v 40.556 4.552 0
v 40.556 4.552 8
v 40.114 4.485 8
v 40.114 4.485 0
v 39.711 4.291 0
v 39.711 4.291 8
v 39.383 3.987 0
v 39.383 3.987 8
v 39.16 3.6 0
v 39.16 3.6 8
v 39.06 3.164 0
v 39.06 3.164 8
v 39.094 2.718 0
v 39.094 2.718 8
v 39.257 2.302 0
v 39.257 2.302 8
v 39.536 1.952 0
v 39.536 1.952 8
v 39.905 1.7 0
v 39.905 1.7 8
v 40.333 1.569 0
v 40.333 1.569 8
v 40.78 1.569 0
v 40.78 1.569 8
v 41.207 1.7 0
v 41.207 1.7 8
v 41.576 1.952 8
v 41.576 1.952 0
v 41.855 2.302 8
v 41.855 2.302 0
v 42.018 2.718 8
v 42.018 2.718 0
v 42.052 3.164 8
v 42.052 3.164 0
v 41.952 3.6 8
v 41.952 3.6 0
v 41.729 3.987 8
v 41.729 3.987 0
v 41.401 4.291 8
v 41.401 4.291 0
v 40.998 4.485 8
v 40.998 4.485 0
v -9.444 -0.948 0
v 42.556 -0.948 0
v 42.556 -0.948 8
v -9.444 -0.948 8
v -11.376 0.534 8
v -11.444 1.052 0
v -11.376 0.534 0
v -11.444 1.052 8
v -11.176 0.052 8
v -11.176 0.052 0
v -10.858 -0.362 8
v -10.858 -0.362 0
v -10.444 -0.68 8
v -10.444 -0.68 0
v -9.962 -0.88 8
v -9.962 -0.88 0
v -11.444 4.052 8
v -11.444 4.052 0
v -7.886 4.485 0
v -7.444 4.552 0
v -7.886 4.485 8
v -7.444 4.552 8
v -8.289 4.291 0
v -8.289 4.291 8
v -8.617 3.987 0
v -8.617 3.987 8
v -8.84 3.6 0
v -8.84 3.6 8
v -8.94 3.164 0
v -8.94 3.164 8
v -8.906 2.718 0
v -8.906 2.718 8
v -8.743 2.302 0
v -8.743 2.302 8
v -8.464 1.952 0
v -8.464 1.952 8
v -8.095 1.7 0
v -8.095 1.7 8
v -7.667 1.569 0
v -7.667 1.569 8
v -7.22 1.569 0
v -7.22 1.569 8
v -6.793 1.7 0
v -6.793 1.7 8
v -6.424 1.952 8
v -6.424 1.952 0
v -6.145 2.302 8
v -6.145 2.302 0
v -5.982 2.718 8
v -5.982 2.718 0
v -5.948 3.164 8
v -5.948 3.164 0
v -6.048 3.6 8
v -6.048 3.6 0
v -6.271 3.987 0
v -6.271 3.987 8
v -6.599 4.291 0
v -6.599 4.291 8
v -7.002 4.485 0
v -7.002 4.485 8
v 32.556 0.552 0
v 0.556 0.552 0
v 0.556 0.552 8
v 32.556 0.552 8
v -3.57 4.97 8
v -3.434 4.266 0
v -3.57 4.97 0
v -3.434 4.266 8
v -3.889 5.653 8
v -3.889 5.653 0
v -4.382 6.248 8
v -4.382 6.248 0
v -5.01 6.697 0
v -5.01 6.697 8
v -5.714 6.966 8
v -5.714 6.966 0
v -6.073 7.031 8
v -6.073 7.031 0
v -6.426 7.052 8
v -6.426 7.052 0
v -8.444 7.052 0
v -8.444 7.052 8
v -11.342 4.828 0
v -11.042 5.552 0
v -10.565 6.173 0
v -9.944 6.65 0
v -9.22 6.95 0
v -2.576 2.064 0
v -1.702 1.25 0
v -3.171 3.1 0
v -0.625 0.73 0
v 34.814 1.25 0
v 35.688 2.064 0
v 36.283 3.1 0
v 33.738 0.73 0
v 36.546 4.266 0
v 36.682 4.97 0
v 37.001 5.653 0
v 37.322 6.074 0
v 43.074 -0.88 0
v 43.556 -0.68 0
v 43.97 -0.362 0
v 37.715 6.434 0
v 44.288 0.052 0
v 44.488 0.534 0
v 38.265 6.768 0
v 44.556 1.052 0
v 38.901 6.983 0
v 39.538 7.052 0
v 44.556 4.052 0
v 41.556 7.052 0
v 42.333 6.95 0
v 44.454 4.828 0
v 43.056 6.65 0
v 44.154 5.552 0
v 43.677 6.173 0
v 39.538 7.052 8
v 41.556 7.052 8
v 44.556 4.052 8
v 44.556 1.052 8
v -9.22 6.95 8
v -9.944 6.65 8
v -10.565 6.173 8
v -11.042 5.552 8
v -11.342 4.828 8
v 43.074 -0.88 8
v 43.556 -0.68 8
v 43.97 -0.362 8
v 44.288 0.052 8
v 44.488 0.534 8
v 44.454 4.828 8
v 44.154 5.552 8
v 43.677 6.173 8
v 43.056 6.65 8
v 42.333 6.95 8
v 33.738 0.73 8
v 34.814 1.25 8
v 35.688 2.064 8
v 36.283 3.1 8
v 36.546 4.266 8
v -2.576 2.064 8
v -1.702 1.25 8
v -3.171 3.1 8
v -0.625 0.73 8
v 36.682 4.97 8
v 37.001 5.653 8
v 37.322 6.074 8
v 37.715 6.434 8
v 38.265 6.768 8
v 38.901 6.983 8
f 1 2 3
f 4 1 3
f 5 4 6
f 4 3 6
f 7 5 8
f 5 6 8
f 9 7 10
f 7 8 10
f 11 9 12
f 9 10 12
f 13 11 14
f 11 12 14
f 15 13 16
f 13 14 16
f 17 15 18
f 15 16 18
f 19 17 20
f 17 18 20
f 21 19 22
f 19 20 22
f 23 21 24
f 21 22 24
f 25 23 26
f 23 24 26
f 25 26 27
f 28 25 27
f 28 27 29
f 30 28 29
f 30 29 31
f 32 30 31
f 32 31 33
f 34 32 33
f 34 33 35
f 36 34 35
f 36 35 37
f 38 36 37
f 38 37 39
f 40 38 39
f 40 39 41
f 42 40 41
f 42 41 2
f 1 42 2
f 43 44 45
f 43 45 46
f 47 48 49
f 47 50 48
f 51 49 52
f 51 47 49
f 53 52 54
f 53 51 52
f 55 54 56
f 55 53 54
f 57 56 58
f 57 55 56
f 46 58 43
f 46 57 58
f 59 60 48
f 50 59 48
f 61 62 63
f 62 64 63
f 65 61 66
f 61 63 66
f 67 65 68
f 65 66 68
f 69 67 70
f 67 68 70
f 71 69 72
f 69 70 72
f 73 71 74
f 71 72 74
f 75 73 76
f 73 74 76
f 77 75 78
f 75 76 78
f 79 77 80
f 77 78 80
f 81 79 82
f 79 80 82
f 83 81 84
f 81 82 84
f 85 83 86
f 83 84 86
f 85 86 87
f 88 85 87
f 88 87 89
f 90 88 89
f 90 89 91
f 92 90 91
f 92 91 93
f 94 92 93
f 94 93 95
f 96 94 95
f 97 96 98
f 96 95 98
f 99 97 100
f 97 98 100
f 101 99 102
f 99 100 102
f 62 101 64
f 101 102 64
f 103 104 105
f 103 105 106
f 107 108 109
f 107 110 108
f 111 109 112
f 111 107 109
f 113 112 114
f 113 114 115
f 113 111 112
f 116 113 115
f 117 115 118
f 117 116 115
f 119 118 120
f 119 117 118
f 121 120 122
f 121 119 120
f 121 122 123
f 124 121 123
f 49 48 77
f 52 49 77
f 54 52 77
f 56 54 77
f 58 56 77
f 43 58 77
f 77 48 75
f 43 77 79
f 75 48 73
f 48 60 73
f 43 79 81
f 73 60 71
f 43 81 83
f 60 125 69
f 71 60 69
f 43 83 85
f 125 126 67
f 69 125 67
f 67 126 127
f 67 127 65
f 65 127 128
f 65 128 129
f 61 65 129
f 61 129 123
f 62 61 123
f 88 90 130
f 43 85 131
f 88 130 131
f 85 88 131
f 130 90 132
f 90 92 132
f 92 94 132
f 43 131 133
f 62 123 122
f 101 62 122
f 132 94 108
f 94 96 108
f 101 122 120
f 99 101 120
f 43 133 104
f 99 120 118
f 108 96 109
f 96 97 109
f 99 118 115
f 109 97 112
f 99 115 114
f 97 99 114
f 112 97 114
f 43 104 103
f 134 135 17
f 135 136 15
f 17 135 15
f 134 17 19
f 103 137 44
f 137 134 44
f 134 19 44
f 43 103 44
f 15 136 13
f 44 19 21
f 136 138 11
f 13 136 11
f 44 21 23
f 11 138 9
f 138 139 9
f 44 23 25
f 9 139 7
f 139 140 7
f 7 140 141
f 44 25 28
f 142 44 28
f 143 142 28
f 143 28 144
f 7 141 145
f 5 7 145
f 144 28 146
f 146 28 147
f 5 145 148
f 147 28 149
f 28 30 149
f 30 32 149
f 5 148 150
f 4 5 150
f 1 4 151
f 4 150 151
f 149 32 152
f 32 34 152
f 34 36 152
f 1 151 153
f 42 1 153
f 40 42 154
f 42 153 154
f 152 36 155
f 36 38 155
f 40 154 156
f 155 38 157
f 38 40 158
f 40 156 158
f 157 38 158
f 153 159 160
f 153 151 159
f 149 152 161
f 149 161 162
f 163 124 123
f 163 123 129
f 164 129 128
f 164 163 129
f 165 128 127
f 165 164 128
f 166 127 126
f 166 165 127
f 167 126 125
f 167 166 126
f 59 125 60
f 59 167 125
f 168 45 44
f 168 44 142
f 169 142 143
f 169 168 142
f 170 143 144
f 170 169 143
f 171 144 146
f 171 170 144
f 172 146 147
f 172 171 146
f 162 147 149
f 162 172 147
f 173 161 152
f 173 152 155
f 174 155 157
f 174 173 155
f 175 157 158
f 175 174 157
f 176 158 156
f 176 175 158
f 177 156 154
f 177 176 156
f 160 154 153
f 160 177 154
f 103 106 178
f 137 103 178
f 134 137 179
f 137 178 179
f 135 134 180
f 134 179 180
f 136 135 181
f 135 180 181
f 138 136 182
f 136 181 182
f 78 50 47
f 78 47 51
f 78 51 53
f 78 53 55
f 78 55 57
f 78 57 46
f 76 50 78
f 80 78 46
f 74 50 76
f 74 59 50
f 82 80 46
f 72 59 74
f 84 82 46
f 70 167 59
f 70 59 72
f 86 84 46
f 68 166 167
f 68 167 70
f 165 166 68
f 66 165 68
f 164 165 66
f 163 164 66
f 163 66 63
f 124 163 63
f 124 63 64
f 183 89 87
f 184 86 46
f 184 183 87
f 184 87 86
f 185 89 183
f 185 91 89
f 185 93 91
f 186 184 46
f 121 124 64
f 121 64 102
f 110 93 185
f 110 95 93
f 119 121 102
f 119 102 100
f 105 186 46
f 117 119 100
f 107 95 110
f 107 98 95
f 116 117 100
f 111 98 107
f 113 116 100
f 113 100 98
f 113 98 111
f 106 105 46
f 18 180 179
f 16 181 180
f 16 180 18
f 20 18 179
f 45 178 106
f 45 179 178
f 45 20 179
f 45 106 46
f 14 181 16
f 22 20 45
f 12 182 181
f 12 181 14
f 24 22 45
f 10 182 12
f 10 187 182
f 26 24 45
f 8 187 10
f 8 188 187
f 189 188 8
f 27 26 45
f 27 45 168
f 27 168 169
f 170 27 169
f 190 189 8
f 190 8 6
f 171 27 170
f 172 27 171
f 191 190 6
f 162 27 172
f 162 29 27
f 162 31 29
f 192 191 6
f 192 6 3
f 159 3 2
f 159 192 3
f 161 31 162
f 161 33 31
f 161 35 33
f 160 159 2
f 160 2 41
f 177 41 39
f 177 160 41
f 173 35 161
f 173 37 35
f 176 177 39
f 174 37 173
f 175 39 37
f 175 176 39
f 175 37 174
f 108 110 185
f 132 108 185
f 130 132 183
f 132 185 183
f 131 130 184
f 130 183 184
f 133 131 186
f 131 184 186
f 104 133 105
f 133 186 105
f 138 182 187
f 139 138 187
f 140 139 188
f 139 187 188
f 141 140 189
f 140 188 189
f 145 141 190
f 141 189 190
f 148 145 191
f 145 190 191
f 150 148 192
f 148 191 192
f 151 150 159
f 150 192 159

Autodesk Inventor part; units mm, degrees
ref_plane "YZ Plane" through (0, 0, 0) normal (1, 0, 0) x (0, 1, 0)
ref_plane "XZ Plane" through (0, 0, 0) normal (0, 1, 0) x (-1, 0, 0)
ref_plane "XY Plane" through (0, 0, 0) normal (0, 0, 1) x (1, 0, 0)
sketch "Sketch1" plane through (0, 0, 0) normal (0, 0, 1) x (1, 0, 0)
  line L0 (-3.4439, 0.5518) -> (36.5561, 0.5518)
  line L1 (44.5561, -0.9482) -> (-11.4439, -0.9482)
  line L2 (-3.4439, 0.5518) -> (-3.4439, 7.0518)
  line L3 (-3.4439, 7.0518) -> (-11.4439, 7.0518)
  line L4 (36.5561, 0.5518) -> (36.5561, 7.0518)
  line L5 (36.5561, 7.0518) -> (44.5561, 7.0518)
  line L6 (-11.4439, 7.0518) -> (-11.4439, -0.9482)
  line L7 (44.5561, 7.0518) -> (44.5561, -0.9482)
  point P0 (0, 0)
  point P1 (-7.4439, 3.0518)
  point P2 (40.5561, 3.0518)
  dimension "d2" = 8
  dimension "d4" = 8
  dimension "d5" = 1.5
  dimension "d6" = 56
  dimension "d7" = 8
  dimension "d8" = 8
  dimension "d9" = 4
  dimension "d10" = 4
  dimension "d11" = 4
  dimension "d12" = 4
extrude "Extrusion1" add sketch "Sketch1" along normal blind 8
hole "Hole1" at (40.5561, 3.0518, 0) at (-7.4439, 3.0518, 0) direction (0, 0, 1) diameter 3 end through all
fillet "Fillet1" radius 4 2 edges at (-3.4439, 0.5518, 4) (36.5561, 0.5518, 4)
fillet "Fillet2" radius 3 4 edges at (-3.4439, 7.0518, 4) (-11.4439, 7.0518, 4) (44.5561, 7.0518, 4) (36.5561, 7.0518, 4)
fillet "Fillet3" radius 2 2 edges at (44.5561, -0.9482, 4) (-11.4439, -0.9482, 4)
equation "\"d4\" = d2"
equation "\"d7\" = d2"
equation "\"d8\" = d2"
equation "\"d9\" = 0.5 * d2"
equation "\"d10\" = 0.5 * d2"
equation "\"d11\" = 0.5 * d2"
equation "\"d12\" = 0.5 * d2"
properties part number "3DP_ABS_Bowl_Spring" material "ABS Plastic"
